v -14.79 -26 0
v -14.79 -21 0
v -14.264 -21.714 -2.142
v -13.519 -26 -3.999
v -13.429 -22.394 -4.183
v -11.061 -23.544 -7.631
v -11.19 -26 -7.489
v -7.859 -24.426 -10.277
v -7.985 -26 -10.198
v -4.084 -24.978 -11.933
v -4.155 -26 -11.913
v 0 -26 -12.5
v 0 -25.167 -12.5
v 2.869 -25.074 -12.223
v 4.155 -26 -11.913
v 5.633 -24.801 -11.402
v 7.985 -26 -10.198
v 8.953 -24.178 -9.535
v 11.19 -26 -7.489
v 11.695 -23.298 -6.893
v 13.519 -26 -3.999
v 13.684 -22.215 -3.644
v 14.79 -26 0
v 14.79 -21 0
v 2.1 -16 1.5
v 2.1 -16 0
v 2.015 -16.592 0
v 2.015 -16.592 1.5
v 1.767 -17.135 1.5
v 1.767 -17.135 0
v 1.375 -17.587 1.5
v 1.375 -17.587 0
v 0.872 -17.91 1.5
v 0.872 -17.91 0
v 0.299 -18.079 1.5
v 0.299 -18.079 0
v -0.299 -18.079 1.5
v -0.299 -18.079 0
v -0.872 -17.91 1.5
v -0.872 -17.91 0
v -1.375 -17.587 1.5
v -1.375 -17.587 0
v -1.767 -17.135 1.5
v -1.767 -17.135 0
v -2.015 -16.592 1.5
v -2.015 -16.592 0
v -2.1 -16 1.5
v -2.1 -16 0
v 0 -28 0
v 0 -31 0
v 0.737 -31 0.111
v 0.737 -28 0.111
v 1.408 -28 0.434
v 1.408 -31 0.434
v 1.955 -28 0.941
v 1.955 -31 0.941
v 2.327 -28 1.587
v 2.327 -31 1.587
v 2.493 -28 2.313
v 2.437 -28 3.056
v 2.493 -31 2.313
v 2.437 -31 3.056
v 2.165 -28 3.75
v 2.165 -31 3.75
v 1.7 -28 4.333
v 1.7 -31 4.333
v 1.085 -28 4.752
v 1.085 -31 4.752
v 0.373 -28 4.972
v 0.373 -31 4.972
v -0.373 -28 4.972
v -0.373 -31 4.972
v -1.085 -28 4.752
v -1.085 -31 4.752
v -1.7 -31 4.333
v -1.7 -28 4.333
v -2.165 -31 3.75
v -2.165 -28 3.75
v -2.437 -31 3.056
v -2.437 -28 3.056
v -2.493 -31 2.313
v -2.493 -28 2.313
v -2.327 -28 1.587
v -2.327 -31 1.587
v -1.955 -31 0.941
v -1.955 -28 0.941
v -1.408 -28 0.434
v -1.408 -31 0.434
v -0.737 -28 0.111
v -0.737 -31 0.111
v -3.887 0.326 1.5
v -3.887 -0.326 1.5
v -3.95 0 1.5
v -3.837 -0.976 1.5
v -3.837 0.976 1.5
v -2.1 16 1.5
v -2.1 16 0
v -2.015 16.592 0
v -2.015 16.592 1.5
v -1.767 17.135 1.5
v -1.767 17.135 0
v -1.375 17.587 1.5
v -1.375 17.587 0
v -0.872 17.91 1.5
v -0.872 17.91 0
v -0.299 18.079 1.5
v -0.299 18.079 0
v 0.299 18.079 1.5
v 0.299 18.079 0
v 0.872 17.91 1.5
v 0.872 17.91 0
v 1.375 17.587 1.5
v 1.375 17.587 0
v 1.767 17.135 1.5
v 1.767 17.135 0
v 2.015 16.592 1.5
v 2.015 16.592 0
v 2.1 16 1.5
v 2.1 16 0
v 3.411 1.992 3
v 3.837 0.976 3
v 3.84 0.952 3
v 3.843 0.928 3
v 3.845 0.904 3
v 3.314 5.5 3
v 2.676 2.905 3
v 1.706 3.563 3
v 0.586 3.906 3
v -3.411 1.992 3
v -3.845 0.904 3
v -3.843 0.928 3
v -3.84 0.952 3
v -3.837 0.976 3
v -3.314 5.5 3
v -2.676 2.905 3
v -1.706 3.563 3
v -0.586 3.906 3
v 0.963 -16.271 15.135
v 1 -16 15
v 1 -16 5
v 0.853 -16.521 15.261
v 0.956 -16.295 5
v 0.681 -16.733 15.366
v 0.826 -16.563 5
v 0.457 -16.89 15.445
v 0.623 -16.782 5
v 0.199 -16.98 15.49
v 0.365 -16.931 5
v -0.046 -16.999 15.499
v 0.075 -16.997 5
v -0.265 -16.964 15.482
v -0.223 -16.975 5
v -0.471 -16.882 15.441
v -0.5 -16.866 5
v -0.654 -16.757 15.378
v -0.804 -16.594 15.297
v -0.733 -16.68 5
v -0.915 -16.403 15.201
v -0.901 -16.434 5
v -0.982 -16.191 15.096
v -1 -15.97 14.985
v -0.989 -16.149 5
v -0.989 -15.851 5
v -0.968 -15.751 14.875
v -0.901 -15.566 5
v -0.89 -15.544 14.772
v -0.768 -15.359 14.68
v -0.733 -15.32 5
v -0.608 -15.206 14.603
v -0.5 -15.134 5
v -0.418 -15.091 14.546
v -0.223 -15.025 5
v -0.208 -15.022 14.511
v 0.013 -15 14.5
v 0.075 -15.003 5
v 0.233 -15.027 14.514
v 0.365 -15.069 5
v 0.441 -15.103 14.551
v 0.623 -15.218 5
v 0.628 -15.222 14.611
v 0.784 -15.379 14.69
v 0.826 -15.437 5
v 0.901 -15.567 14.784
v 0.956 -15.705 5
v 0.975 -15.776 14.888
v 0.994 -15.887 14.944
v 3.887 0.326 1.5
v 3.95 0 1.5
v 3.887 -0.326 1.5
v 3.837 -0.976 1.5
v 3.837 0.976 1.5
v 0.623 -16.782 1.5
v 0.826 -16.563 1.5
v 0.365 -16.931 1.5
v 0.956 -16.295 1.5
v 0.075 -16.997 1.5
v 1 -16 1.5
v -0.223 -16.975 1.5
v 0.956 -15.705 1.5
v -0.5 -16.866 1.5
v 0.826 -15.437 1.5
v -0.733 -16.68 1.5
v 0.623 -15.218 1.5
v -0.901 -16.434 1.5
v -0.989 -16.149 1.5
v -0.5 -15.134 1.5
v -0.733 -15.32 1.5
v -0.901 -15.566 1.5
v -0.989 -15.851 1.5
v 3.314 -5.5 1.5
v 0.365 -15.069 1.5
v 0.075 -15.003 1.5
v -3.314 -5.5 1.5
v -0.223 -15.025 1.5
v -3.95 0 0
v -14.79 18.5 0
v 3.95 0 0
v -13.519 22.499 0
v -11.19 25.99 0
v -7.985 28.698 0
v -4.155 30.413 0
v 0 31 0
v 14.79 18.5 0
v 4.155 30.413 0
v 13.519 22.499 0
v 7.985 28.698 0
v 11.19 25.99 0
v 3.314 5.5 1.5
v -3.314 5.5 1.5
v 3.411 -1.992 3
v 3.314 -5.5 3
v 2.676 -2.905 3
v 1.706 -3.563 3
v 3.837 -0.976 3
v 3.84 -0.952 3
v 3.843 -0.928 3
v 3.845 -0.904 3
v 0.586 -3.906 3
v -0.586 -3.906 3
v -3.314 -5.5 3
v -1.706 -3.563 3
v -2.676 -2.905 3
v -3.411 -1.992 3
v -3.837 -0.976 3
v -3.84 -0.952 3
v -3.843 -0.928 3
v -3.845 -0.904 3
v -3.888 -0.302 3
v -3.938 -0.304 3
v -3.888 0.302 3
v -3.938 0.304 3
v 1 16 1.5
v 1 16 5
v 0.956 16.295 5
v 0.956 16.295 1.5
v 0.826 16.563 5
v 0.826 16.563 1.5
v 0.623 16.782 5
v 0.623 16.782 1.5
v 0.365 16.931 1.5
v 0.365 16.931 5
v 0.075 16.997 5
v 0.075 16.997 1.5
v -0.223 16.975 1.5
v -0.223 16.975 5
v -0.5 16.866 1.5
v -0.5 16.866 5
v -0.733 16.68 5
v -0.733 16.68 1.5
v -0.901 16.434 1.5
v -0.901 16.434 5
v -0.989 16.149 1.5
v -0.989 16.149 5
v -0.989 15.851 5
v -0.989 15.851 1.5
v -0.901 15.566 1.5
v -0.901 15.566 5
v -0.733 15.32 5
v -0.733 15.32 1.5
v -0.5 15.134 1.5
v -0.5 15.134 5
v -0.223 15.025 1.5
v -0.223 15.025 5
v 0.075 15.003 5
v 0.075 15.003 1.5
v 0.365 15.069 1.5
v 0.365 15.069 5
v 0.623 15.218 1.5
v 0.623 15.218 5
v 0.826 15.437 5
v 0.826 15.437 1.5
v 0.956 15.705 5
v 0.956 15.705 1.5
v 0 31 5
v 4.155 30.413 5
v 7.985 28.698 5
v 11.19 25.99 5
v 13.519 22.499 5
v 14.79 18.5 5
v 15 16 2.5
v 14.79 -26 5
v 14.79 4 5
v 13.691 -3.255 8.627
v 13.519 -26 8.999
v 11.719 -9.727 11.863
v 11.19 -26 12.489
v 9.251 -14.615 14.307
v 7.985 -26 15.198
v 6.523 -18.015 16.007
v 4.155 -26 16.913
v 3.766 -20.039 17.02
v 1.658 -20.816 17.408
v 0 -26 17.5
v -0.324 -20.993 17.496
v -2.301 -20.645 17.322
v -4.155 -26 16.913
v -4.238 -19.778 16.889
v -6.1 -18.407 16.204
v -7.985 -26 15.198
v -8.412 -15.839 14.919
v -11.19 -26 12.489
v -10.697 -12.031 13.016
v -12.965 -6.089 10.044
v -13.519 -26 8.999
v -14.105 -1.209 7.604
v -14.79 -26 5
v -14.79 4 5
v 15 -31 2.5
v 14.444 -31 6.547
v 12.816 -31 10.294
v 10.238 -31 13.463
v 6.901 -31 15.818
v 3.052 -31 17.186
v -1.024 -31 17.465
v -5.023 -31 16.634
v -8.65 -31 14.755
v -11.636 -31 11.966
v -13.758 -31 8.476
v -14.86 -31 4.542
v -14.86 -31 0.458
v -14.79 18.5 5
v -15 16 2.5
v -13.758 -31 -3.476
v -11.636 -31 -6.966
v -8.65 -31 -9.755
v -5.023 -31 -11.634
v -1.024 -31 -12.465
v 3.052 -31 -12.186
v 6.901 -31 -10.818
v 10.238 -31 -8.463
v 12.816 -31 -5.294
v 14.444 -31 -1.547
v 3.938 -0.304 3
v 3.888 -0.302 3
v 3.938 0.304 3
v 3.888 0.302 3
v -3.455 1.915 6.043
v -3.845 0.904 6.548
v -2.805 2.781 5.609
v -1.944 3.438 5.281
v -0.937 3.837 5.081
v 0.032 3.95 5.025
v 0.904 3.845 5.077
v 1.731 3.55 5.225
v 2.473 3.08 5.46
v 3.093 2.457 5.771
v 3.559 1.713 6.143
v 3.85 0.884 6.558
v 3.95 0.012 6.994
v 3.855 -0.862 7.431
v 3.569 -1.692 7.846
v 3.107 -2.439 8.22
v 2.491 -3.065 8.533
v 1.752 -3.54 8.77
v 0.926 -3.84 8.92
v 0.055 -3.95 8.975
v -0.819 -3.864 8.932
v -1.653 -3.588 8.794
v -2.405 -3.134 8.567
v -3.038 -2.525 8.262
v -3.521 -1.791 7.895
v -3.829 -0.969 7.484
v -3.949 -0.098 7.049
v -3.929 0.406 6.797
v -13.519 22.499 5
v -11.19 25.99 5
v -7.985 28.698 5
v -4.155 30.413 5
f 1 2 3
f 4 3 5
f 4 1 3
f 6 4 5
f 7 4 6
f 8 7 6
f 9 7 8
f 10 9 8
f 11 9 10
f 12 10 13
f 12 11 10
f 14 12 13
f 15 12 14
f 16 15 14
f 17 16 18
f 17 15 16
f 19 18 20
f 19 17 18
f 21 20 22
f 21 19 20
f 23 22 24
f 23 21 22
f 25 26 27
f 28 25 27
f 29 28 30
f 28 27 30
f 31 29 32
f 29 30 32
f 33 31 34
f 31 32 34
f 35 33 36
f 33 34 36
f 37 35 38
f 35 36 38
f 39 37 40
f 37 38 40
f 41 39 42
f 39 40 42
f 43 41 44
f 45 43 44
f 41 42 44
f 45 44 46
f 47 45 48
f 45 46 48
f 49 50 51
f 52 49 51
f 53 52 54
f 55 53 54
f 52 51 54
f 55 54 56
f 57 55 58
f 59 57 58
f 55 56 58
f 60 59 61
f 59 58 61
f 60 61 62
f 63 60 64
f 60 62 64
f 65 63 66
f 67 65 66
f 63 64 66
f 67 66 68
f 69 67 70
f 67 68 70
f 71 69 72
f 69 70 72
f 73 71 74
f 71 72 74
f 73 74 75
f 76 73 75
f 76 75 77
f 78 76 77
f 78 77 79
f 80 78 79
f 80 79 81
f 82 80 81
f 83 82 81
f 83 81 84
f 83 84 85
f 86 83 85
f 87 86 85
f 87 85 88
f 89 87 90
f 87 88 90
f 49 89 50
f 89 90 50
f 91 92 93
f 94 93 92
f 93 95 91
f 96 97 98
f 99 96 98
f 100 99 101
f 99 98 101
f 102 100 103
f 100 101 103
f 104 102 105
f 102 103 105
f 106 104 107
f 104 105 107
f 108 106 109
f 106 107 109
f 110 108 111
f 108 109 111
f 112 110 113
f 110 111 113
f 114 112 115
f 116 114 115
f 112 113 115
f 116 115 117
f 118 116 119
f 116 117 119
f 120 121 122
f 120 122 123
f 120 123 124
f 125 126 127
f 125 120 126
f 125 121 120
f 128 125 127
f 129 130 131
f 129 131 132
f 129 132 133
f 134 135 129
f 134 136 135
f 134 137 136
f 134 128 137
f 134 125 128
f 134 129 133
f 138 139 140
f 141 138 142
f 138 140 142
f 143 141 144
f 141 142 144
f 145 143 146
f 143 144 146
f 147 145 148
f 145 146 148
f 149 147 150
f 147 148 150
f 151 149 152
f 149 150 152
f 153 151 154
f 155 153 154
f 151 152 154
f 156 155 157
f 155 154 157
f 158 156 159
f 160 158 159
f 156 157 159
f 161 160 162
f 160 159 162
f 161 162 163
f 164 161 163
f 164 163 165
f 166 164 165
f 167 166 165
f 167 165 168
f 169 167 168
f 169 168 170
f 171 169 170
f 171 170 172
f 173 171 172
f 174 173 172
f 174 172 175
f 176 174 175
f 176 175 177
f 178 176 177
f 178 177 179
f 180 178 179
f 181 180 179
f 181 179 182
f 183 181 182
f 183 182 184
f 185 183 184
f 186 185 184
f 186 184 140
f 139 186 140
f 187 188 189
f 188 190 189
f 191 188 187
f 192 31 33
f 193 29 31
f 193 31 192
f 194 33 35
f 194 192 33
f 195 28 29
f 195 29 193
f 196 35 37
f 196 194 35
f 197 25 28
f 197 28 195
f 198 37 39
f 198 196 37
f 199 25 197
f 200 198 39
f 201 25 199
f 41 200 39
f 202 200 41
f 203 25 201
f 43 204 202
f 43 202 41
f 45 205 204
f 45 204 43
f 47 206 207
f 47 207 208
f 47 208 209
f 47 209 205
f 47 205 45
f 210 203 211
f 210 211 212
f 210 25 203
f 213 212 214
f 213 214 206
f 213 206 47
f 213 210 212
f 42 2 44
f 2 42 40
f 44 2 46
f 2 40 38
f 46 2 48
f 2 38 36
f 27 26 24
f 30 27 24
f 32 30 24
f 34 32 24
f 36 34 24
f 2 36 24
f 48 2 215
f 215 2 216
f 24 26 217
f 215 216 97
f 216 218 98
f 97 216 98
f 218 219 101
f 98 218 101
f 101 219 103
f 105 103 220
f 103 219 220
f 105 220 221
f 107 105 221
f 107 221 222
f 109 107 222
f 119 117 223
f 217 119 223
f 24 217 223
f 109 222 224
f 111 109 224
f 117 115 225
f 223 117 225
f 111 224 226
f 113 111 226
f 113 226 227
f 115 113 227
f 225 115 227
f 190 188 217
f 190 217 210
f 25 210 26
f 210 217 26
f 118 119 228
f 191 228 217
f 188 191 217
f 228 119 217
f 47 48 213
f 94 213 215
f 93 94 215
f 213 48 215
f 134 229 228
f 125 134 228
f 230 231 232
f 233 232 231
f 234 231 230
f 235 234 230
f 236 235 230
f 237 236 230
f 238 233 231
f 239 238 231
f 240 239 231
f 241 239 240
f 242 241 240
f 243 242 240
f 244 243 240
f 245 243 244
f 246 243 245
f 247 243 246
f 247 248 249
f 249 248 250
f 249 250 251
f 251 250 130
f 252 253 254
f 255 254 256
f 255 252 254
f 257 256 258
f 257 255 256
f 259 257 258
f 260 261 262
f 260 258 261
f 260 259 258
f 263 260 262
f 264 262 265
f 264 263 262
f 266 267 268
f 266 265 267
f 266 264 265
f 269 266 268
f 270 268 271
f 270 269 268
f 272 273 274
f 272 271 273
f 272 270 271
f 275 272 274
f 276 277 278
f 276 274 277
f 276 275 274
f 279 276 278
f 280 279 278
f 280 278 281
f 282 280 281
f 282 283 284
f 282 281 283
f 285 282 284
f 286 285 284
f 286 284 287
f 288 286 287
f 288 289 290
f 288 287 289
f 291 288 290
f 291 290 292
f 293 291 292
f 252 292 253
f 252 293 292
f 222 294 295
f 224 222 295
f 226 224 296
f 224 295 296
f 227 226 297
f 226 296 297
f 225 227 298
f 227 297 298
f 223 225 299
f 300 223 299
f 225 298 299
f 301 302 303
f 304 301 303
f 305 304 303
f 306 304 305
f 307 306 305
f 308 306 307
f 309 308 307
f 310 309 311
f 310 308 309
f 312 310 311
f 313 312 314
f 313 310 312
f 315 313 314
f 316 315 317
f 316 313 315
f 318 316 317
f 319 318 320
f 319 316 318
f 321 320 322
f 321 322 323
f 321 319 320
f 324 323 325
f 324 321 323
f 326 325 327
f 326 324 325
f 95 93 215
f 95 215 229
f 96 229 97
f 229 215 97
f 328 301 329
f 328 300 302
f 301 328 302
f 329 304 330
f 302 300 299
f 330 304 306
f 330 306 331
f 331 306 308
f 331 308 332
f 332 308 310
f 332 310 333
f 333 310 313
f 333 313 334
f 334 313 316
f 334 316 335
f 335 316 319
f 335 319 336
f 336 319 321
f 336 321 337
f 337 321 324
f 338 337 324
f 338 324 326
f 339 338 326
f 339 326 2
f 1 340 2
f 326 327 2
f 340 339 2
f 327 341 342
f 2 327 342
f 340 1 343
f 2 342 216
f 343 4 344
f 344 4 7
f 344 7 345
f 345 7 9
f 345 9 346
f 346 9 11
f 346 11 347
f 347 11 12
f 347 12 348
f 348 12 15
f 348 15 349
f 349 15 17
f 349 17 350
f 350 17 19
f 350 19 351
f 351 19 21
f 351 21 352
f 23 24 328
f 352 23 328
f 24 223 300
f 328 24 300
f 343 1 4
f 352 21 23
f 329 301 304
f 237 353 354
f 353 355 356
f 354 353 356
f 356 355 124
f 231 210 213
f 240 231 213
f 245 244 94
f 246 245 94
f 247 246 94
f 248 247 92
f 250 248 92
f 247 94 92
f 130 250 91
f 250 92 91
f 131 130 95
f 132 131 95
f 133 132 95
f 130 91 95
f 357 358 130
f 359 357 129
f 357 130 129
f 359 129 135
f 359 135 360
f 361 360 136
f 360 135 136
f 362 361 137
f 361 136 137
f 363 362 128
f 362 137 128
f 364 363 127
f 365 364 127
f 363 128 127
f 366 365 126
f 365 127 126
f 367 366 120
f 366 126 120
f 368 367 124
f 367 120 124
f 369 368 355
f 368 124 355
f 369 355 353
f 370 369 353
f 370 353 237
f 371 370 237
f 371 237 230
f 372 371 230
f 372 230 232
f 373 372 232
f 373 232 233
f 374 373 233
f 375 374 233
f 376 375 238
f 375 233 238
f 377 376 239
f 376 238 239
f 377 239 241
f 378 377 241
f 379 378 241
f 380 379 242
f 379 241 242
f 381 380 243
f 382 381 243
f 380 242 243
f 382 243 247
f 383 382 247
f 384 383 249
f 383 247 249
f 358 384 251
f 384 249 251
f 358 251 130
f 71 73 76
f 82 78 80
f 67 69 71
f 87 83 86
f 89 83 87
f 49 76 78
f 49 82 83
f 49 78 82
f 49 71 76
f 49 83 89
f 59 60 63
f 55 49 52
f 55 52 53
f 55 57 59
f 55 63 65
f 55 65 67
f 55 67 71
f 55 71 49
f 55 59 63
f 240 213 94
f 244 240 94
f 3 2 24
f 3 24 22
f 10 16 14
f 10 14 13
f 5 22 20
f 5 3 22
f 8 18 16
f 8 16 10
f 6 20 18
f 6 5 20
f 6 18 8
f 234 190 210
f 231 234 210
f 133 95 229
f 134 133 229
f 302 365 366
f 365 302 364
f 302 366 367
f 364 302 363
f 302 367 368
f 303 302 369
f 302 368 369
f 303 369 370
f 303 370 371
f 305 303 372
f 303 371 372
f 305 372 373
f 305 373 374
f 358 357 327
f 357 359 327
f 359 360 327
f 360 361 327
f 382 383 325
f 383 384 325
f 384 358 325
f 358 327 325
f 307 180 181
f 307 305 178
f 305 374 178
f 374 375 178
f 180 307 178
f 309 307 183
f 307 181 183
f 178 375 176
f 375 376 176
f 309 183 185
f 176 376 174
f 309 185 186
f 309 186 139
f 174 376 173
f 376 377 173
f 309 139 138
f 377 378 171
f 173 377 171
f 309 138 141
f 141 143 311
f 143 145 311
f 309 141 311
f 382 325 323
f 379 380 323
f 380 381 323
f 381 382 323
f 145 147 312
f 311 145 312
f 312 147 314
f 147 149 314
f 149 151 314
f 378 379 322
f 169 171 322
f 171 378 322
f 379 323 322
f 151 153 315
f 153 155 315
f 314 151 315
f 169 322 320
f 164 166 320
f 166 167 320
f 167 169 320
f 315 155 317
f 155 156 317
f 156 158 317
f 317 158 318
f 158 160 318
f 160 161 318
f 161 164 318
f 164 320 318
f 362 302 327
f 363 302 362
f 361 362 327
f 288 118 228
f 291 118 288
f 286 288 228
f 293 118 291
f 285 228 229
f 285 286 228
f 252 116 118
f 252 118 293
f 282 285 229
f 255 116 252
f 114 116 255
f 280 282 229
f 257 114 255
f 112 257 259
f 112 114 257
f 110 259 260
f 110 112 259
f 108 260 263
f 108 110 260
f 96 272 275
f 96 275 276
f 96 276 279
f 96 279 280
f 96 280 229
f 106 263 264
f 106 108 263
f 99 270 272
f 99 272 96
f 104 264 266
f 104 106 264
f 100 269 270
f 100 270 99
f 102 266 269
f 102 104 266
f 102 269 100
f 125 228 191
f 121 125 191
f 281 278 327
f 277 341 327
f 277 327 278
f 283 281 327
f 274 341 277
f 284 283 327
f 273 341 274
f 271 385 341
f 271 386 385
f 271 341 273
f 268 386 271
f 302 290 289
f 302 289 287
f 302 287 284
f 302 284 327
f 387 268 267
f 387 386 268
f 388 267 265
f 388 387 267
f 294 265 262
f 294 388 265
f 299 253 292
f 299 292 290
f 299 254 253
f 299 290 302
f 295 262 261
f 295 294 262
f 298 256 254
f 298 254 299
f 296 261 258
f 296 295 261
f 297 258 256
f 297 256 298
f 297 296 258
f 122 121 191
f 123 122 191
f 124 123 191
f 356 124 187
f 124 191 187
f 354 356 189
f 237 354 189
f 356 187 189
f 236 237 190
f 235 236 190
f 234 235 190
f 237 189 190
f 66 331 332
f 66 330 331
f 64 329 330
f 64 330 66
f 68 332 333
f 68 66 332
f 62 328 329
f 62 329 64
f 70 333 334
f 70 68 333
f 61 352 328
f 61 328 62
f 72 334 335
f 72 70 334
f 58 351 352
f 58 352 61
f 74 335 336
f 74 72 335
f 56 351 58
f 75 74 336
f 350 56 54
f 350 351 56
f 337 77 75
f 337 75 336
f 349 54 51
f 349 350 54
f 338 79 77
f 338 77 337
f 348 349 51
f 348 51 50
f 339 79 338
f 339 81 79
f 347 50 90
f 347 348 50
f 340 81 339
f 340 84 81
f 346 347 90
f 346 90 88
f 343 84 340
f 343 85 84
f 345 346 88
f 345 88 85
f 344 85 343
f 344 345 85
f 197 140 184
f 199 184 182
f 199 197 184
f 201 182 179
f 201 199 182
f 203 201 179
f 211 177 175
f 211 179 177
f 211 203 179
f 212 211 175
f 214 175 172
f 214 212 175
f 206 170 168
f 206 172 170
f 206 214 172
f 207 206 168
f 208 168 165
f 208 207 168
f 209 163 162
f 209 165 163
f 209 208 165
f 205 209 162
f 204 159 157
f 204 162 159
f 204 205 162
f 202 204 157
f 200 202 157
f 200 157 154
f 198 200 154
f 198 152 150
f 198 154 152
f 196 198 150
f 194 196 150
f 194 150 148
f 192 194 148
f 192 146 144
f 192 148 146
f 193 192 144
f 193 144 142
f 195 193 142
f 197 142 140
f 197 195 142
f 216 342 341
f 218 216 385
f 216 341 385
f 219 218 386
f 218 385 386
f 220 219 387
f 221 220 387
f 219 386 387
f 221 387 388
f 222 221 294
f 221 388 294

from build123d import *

# Parameters (mm, degrees)
SKETCH2_W            = 30
SKETCH2_H            = 62
BOSS_EXTRUDE10_DEPTH = 5
SKETCH1_R            = 1
CUT_EXTRUDE5_DEPTH   = 1.5
SKETCH1_14_R         = 1
CUT_EXTRUDE6_DEPTH   = 35.799425283
FILLET1_R            = 15
SKETCH5_W            = 30
SKETCH5_H            = 5
BOSS_EXTRUDE11_DEPTH = 12.5
FILLET2_R            = 15
SKETCH7_R            = 2.5
CUT_EXTRUDE7_DEPTH   = 3
CHAMFER1_SIZE        = 30
CHAMFER1_SIZE_2      = 15
CHAMFER2_SIZE        = 5
CHAMFER2_SIZE_2      = 15
CUT_EXTRUDE8_DEPTH   = 1.5
SKETCH9_R            = 3.95
CUT_EXTRUDE9_DEPTH   = 10


# Some blends are built 0.0001 mm under size
with BuildPart() as part:
    # Sketch2 → Boss-Extrude10 (new body)
    with BuildSketch(Plane.XY):
        Rectangle(SKETCH2_W, SKETCH2_H)
    extrude(amount=BOSS_EXTRUDE10_DEPTH)

    # Sketch1 → Cut-Extrude5 (cut)
    with BuildSketch(Plane.XY):
        with BuildLine():
            ThreePointArc((2.1, -16), (0, -18.1), (-2.1, -16))
            Line((-2.1, -16), (-3.95, 0))
            Line((-3.95, 0), (-2.1, 16))
            ThreePointArc((-2.1, 16), (0, 18.1), (2.1, 16))
            Line((2.1, 16), (3.95, 0))
            Line((3.95, 0), (2.1, -16))
        make_face()
        with Locations((0, -16)):
            Circle(SKETCH1_R, mode=Mode.SUBTRACT)
        with Locations((0, 16)):
            Circle(SKETCH1_R, mode=Mode.SUBTRACT)
    extrude(amount=CUT_EXTRUDE5_DEPTH, mode=Mode.SUBTRACT)

    # Sketch1<14> → Cut-Extrude6 (cut, through all)
    with BuildSketch(Plane.XY):
        with Locations((0, 16)):
            Circle(SKETCH1_14_R)
        with Locations((0, -16)):
            Circle(SKETCH1_14_R)
    extrude(amount=CUT_EXTRUDE6_DEPTH, mode=Mode.SUBTRACT)

    # Fillet1
    fillet1_edges = [part.edges().sort_by_distance(p)[0] for p in [
        (-15, 31, 2.5),
        (15, 31, 2.5),
    ]]
    fillet(fillet1_edges, radius=FILLET1_R - 0.0001)  # a hair under: the kernel refuses the full size

    # Sketch5 → Boss-Extrude11 (add)
    with BuildSketch(Plane(origin=(0, 0, 0), x_dir=(-1, 0, 0), z_dir=(0, 0, -1))):
        with Locations((0, -28.5)):
            Rectangle(SKETCH5_W, SKETCH5_H)
    boss_extrude11 = extrude(amount=BOSS_EXTRUDE11_DEPTH)

    # Mirror1: Boss-Extrude11 across plane
    add(boss_extrude11.mirror(Plane.XY.offset(2.5)))

    # Fillet2
    # the kernel refuses this fillet: 15 mm, written as the material it takes off along each edge
    with BuildSketch(Plane(origin=(15, 64, 17.5), x_dir=(0, 0, -1), z_dir=(0, -1, 0)), Plane(origin=(-15, -121, 17.5), x_dir=(0, 0, -1), z_dir=(0, 1, 0))) as fillet2_piece_1:
        with BuildLine():
            CenterArc((FILLET2_R, -FILLET2_R), FILLET2_R, 90, 90)
            Line((0, -FILLET2_R), (-FILLET2_R * 0.02, -FILLET2_R))
            Line((-FILLET2_R * 0.02, -FILLET2_R), (-FILLET2_R * 0.02, FILLET2_R * 0.02))
            Line((-FILLET2_R * 0.02, FILLET2_R * 0.02), (FILLET2_R, FILLET2_R * 0.02))
            Line((FILLET2_R, FILLET2_R * 0.02), (FILLET2_R, 0))
        make_face()
    extrude(amount=185, mode=Mode.SUBTRACT)
    with BuildSketch(Plane(origin=(-15, -121, -12.5), x_dir=(0, 0, 1), z_dir=(0, 1, 0)), Plane(origin=(15, 64, -12.5), x_dir=(0, 0, 1), z_dir=(0, -1, 0))) as fillet2_piece_2:
        with BuildLine():
            CenterArc((FILLET2_R, FILLET2_R), FILLET2_R, 180, 90)
            Line((0, FILLET2_R), (-FILLET2_R * 0.02, FILLET2_R))
            Line((-FILLET2_R * 0.02, FILLET2_R), (-FILLET2_R * 0.02, -FILLET2_R * 0.02))
            Line((-FILLET2_R * 0.02, -FILLET2_R * 0.02), (FILLET2_R, -FILLET2_R * 0.02))
            Line((FILLET2_R, -FILLET2_R * 0.02), (FILLET2_R, 0))
        make_face()
    extrude(amount=185, mode=Mode.SUBTRACT)

    # Sketch7 → Cut-Extrude7 (cut)
    with BuildSketch(Plane.XZ.offset(31)):
        with Locations(Location((0, 2.5, 0), (0, 0, 270))):
            Circle(SKETCH7_R)
    extrude(amount=-CUT_EXTRUDE7_DEPTH, mode=Mode.SUBTRACT)

    # Chamfer1
    # the kernel refuses this chamfer: 30, 15 mm, written as the material it adds along each edge
    with BuildSketch(Plane(origin=(-92.485065671, -26, 5), x_dir=(0, 0.9998508956747117, -0.017268075123668125), z_dir=(1, 0, 0))) as chamfer1_piece_1_section:
        Polygon((CHAMFER1_SIZE * 0.999850895675, CHAMFER1_SIZE * 0.0172680751237), (-CHAMFER1_SIZE_2 * 0.0172680751237, CHAMFER1_SIZE_2 * 0.999850895675), (0, 0), align=None)
    chamfer1_piece_1 = extrude(amount=184.970131343, mode=Mode.PRIVATE)
    chamfer1_piece_1 = chamfer1_piece_1 & Plane(origin=(0, -14.759423462, 2.5), x_dir=(0, 0, -1), z_dir=(0, -1, 0)) * Cylinder(15, 490, mode=Mode.PRIVATE)
    chamfer1_piece_1 = chamfer1_piece_1 - Plane(origin=(0, -16, 8.704221218), x_dir=(1, 0, 0), z_dir=(0, 0, -1)) * Cylinder(1, 490, mode=Mode.PRIVATE)
    add(chamfer1_piece_1)

    # Chamfer2
    # the kernel refuses this chamfer: 15, 5 mm, written as the material it adds along each edge
    with BuildSketch(Plane(origin=(-53.716114618, -26, 0), x_dir=(0, 0.9940388851139267, 0.10902612017980706), z_dir=(1, 0, 0))) as chamfer2_piece_1_section:
        Polygon((CHAMFER2_SIZE * 0.994038885114, -CHAMFER2_SIZE * 0.10902612018), (-CHAMFER2_SIZE_2 * 0.10902612018, -CHAMFER2_SIZE_2 * 0.994038885114), (0, 0), align=None)
    chamfer2_piece_1 = extrude(amount=107.432229235, mode=Mode.PRIVATE)
    chamfer2_piece_1 = chamfer2_piece_1 & Plane(origin=(0, -24.267585927, 2.5), x_dir=(0, 0, -1), z_dir=(0, -1, 0)) * Cylinder(15, 275, mode=Mode.PRIVATE)
    add(chamfer2_piece_1)

    # Sketch8 → Cut-Extrude8 (cut)
    with BuildSketch(Plane(origin=(0, 0, 1.5), x_dir=(-1, 0, 0), z_dir=(0, 0, -1))):
        with BuildLine():
            Line((-3.3140625, -5.5), (3.3140625, -5.5))
            Line((3.3140625, -5.5), (3.837114391, -0.976307969))
            ThreePointArc((3.837114391, -0.976307969), (3.893369798, 0), (3.837114391, 0.976307969))
            Line((3.837114391, 0.976307969), (3.3140625, 5.5))
            Line((3.3140625, 5.5), (-3.3140625, 5.5))
            Line((-3.3140625, 5.5), (-3.837114391, 0.976307969))
            ThreePointArc((-3.837114391, 0.976307969), (-3.893369798, 0), (-3.837114391, -0.976307969))
            Line((-3.837114391, -0.976307969), (-3.3140625, -5.5))
        make_face()
    extrude(amount=-CUT_EXTRUDE8_DEPTH, mode=Mode.SUBTRACT)

    # Sketch9 → Cut-Extrude9 (cut)
    with BuildSketch(Plane(origin=(0, 0, 3), x_dir=(-1, 0, 0), z_dir=(0, 0, -1))):
        with Locations(Location((0, 0, 0), (0, 0, 13.230259738))):
            Circle(SKETCH9_R)
    extrude(amount=-CUT_EXTRUDE9_DEPTH, mode=Mode.SUBTRACT)


solid = part.part
